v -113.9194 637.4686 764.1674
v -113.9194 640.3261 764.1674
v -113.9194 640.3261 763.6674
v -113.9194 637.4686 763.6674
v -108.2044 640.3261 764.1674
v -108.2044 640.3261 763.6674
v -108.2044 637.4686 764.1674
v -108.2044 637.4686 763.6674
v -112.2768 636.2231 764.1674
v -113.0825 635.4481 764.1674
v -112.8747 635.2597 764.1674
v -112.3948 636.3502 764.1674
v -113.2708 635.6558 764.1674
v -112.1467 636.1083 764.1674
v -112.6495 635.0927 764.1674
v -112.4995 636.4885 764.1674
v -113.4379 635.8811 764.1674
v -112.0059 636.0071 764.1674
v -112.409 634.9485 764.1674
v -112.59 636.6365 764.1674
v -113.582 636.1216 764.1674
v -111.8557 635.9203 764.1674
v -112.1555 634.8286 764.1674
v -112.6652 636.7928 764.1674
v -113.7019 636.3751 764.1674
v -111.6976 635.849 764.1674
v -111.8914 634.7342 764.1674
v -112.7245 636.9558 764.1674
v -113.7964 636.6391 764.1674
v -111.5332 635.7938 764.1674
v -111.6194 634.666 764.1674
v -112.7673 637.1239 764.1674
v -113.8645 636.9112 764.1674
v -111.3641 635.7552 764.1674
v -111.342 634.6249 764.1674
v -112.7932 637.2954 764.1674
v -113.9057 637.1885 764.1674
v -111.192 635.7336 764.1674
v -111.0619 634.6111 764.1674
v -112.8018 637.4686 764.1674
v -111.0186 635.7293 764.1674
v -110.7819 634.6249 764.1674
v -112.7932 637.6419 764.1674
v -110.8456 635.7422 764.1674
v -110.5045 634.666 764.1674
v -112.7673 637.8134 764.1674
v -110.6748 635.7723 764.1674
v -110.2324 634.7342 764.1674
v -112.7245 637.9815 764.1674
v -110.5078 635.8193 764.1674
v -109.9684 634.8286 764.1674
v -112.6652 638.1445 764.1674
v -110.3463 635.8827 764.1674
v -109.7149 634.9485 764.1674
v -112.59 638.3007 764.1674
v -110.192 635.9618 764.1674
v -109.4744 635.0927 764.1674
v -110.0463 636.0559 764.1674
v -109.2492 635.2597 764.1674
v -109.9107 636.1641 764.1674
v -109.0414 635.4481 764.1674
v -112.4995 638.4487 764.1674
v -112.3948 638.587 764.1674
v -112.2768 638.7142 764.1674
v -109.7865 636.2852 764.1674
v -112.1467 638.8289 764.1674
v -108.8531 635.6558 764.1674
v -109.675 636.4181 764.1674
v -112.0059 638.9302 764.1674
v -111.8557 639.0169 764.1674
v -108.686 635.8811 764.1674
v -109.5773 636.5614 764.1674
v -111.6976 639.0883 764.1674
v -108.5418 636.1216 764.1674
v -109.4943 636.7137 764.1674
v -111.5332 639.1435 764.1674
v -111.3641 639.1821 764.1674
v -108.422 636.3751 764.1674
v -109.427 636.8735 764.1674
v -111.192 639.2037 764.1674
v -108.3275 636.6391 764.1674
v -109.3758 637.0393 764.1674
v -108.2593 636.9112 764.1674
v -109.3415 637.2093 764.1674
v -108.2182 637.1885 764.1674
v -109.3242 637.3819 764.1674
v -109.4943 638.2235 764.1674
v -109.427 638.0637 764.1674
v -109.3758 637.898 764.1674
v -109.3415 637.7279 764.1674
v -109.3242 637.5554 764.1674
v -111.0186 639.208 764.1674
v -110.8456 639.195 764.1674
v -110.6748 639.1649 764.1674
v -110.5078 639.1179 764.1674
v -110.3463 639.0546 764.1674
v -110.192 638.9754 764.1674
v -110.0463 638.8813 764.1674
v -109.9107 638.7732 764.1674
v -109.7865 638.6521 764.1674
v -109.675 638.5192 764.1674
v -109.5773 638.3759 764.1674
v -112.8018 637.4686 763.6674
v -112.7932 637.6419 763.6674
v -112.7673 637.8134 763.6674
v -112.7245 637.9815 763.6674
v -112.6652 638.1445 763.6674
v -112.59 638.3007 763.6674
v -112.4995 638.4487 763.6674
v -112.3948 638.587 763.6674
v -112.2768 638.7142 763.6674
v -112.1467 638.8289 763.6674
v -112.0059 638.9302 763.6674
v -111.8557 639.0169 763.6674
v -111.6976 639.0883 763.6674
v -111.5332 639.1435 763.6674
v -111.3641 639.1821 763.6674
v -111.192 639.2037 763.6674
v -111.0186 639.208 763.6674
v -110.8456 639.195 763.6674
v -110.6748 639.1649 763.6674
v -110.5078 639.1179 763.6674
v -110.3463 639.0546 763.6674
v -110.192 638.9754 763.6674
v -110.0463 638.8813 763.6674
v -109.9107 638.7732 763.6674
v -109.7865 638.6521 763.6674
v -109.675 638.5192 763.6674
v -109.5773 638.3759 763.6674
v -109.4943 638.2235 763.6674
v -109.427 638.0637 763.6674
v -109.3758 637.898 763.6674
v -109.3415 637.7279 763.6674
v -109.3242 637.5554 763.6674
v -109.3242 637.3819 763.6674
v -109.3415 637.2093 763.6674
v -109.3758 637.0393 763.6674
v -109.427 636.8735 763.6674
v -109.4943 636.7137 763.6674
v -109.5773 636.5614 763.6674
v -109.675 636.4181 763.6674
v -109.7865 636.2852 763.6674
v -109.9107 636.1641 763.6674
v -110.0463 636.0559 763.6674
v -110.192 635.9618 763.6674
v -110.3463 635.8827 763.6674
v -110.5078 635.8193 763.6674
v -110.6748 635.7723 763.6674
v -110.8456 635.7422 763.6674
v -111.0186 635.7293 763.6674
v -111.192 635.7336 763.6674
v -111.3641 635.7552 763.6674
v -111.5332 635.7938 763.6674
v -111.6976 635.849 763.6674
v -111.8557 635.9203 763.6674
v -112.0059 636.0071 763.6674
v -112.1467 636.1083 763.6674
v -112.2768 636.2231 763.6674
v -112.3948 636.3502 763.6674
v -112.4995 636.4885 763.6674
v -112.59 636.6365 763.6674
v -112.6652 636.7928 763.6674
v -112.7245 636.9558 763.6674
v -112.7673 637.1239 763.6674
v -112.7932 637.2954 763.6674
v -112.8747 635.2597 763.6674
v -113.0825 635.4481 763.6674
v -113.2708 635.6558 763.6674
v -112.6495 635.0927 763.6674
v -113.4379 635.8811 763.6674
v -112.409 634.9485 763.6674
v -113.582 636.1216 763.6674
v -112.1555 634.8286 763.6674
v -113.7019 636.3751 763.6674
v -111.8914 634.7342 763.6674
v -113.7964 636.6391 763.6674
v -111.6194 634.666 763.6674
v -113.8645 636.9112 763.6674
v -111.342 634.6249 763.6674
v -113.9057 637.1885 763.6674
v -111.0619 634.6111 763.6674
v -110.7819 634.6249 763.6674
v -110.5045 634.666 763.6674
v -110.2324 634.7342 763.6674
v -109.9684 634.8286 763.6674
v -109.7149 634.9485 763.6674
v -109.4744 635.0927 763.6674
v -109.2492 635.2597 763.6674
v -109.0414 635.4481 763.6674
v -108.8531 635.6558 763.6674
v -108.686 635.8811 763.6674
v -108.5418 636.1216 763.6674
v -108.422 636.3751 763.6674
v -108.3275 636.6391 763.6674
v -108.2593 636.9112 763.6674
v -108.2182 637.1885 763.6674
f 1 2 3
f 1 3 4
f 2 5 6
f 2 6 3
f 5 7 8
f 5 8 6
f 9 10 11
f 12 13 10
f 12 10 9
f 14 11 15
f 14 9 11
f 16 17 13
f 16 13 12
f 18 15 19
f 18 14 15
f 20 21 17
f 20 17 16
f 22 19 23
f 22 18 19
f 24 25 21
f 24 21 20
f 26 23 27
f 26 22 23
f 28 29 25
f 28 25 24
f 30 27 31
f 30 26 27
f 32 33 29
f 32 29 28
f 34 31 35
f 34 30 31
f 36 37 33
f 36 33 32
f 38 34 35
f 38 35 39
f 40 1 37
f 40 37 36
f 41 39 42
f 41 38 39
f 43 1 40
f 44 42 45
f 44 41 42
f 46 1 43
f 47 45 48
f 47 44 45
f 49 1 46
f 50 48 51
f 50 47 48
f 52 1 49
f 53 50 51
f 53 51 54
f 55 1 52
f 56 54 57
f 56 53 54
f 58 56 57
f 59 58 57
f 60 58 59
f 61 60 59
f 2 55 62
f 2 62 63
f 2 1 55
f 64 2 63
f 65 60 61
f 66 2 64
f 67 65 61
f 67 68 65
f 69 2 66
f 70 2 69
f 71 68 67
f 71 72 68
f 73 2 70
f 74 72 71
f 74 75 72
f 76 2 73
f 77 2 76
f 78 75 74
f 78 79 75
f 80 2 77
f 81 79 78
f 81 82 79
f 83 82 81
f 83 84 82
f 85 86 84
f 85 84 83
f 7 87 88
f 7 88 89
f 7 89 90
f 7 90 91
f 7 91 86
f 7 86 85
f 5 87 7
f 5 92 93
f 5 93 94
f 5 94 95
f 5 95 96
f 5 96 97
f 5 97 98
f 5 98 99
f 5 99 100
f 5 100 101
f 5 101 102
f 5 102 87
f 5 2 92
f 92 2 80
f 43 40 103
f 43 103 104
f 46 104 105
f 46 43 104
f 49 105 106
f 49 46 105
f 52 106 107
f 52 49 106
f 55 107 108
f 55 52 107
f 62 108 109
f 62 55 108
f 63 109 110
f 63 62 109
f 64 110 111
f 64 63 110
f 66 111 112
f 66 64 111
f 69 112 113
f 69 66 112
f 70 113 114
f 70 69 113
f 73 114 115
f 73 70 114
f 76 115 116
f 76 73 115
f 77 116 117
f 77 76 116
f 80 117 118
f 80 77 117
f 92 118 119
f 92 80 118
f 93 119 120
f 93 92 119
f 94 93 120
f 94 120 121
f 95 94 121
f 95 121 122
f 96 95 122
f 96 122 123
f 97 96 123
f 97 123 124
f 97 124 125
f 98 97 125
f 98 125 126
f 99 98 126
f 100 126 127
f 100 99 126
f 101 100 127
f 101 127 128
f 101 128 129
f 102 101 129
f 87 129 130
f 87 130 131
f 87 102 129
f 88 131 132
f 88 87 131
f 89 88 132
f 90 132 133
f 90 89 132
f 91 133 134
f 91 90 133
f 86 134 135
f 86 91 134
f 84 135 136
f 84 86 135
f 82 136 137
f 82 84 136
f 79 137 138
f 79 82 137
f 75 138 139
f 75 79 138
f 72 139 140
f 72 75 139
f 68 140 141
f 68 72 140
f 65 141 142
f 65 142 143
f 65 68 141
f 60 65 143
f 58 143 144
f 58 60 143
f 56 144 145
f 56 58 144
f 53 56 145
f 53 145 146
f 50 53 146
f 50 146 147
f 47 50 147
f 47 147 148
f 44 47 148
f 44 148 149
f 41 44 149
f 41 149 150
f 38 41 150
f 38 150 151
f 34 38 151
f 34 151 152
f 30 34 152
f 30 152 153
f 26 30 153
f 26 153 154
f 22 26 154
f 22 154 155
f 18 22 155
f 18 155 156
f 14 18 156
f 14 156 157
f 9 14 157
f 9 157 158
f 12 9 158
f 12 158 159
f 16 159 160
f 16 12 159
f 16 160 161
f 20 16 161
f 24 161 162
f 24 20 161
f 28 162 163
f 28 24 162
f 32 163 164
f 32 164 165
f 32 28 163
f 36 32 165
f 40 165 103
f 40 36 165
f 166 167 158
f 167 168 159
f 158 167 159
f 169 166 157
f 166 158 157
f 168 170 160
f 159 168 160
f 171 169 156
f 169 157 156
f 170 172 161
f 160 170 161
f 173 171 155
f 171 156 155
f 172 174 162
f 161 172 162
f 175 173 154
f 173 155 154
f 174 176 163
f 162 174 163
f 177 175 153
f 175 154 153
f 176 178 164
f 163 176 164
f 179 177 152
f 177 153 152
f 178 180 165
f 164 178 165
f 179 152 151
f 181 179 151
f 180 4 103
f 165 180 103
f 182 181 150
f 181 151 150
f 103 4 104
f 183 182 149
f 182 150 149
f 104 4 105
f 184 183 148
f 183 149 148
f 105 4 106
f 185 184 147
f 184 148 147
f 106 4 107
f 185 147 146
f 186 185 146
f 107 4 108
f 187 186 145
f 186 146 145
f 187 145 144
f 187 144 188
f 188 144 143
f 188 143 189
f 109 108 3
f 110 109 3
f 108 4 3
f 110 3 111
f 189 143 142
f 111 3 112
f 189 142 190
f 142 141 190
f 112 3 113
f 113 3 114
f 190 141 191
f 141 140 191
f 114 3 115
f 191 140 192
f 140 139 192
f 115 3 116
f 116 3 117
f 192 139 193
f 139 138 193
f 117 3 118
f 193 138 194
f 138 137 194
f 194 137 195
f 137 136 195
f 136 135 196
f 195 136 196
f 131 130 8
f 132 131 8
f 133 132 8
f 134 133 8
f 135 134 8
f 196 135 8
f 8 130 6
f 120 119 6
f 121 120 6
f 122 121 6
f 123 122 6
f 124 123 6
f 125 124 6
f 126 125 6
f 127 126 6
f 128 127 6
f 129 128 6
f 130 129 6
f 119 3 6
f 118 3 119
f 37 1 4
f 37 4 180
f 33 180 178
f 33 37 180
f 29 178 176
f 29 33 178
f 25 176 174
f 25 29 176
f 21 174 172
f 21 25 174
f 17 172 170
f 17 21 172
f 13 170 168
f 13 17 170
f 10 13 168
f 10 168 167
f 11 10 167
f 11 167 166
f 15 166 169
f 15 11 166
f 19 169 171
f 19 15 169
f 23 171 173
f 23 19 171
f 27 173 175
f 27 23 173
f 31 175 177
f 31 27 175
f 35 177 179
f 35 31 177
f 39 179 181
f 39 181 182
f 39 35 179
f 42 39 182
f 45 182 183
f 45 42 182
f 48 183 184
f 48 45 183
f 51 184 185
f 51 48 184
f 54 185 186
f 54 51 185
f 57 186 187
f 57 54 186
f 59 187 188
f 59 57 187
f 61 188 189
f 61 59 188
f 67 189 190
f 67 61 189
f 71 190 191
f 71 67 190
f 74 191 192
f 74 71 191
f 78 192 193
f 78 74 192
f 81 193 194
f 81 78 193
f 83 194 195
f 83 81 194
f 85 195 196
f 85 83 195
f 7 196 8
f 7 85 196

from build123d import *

# Parameters (mm, degrees)
SKETCH1_R           = 1.7399
BOSS_EXTRUDE1_DEPTH = 0.5


with BuildPart() as part:
    # Sketch1 → Boss-Extrude1 (new body)
    with BuildSketch(Plane(origin=(0, 0, 764.167404568), x_dir=(-1, 0, 0), z_dir=(0, 0, -1))):
        with BuildLine():
            Line((108.204437713, 637.468625119), (108.204437713, 640.326125119))
            Line((108.204437713, 640.326125119), (111.061937713, 640.326125119))
            Line((111.061937713, 640.326125119), (113.919437713, 640.326125119))
            Line((113.919437713, 640.326125119), (113.919437713, 637.468625119))
            ThreePointArc((113.919437713, 637.468625119), (111.061937713, 634.611125119), (108.204437713, 637.468625119))
        make_face()
        with Locations((111.061937713, 637.468625119)):
            Circle(SKETCH1_R, mode=Mode.SUBTRACT)
    extrude(amount=BOSS_EXTRUDE1_DEPTH)


solid = part.part
